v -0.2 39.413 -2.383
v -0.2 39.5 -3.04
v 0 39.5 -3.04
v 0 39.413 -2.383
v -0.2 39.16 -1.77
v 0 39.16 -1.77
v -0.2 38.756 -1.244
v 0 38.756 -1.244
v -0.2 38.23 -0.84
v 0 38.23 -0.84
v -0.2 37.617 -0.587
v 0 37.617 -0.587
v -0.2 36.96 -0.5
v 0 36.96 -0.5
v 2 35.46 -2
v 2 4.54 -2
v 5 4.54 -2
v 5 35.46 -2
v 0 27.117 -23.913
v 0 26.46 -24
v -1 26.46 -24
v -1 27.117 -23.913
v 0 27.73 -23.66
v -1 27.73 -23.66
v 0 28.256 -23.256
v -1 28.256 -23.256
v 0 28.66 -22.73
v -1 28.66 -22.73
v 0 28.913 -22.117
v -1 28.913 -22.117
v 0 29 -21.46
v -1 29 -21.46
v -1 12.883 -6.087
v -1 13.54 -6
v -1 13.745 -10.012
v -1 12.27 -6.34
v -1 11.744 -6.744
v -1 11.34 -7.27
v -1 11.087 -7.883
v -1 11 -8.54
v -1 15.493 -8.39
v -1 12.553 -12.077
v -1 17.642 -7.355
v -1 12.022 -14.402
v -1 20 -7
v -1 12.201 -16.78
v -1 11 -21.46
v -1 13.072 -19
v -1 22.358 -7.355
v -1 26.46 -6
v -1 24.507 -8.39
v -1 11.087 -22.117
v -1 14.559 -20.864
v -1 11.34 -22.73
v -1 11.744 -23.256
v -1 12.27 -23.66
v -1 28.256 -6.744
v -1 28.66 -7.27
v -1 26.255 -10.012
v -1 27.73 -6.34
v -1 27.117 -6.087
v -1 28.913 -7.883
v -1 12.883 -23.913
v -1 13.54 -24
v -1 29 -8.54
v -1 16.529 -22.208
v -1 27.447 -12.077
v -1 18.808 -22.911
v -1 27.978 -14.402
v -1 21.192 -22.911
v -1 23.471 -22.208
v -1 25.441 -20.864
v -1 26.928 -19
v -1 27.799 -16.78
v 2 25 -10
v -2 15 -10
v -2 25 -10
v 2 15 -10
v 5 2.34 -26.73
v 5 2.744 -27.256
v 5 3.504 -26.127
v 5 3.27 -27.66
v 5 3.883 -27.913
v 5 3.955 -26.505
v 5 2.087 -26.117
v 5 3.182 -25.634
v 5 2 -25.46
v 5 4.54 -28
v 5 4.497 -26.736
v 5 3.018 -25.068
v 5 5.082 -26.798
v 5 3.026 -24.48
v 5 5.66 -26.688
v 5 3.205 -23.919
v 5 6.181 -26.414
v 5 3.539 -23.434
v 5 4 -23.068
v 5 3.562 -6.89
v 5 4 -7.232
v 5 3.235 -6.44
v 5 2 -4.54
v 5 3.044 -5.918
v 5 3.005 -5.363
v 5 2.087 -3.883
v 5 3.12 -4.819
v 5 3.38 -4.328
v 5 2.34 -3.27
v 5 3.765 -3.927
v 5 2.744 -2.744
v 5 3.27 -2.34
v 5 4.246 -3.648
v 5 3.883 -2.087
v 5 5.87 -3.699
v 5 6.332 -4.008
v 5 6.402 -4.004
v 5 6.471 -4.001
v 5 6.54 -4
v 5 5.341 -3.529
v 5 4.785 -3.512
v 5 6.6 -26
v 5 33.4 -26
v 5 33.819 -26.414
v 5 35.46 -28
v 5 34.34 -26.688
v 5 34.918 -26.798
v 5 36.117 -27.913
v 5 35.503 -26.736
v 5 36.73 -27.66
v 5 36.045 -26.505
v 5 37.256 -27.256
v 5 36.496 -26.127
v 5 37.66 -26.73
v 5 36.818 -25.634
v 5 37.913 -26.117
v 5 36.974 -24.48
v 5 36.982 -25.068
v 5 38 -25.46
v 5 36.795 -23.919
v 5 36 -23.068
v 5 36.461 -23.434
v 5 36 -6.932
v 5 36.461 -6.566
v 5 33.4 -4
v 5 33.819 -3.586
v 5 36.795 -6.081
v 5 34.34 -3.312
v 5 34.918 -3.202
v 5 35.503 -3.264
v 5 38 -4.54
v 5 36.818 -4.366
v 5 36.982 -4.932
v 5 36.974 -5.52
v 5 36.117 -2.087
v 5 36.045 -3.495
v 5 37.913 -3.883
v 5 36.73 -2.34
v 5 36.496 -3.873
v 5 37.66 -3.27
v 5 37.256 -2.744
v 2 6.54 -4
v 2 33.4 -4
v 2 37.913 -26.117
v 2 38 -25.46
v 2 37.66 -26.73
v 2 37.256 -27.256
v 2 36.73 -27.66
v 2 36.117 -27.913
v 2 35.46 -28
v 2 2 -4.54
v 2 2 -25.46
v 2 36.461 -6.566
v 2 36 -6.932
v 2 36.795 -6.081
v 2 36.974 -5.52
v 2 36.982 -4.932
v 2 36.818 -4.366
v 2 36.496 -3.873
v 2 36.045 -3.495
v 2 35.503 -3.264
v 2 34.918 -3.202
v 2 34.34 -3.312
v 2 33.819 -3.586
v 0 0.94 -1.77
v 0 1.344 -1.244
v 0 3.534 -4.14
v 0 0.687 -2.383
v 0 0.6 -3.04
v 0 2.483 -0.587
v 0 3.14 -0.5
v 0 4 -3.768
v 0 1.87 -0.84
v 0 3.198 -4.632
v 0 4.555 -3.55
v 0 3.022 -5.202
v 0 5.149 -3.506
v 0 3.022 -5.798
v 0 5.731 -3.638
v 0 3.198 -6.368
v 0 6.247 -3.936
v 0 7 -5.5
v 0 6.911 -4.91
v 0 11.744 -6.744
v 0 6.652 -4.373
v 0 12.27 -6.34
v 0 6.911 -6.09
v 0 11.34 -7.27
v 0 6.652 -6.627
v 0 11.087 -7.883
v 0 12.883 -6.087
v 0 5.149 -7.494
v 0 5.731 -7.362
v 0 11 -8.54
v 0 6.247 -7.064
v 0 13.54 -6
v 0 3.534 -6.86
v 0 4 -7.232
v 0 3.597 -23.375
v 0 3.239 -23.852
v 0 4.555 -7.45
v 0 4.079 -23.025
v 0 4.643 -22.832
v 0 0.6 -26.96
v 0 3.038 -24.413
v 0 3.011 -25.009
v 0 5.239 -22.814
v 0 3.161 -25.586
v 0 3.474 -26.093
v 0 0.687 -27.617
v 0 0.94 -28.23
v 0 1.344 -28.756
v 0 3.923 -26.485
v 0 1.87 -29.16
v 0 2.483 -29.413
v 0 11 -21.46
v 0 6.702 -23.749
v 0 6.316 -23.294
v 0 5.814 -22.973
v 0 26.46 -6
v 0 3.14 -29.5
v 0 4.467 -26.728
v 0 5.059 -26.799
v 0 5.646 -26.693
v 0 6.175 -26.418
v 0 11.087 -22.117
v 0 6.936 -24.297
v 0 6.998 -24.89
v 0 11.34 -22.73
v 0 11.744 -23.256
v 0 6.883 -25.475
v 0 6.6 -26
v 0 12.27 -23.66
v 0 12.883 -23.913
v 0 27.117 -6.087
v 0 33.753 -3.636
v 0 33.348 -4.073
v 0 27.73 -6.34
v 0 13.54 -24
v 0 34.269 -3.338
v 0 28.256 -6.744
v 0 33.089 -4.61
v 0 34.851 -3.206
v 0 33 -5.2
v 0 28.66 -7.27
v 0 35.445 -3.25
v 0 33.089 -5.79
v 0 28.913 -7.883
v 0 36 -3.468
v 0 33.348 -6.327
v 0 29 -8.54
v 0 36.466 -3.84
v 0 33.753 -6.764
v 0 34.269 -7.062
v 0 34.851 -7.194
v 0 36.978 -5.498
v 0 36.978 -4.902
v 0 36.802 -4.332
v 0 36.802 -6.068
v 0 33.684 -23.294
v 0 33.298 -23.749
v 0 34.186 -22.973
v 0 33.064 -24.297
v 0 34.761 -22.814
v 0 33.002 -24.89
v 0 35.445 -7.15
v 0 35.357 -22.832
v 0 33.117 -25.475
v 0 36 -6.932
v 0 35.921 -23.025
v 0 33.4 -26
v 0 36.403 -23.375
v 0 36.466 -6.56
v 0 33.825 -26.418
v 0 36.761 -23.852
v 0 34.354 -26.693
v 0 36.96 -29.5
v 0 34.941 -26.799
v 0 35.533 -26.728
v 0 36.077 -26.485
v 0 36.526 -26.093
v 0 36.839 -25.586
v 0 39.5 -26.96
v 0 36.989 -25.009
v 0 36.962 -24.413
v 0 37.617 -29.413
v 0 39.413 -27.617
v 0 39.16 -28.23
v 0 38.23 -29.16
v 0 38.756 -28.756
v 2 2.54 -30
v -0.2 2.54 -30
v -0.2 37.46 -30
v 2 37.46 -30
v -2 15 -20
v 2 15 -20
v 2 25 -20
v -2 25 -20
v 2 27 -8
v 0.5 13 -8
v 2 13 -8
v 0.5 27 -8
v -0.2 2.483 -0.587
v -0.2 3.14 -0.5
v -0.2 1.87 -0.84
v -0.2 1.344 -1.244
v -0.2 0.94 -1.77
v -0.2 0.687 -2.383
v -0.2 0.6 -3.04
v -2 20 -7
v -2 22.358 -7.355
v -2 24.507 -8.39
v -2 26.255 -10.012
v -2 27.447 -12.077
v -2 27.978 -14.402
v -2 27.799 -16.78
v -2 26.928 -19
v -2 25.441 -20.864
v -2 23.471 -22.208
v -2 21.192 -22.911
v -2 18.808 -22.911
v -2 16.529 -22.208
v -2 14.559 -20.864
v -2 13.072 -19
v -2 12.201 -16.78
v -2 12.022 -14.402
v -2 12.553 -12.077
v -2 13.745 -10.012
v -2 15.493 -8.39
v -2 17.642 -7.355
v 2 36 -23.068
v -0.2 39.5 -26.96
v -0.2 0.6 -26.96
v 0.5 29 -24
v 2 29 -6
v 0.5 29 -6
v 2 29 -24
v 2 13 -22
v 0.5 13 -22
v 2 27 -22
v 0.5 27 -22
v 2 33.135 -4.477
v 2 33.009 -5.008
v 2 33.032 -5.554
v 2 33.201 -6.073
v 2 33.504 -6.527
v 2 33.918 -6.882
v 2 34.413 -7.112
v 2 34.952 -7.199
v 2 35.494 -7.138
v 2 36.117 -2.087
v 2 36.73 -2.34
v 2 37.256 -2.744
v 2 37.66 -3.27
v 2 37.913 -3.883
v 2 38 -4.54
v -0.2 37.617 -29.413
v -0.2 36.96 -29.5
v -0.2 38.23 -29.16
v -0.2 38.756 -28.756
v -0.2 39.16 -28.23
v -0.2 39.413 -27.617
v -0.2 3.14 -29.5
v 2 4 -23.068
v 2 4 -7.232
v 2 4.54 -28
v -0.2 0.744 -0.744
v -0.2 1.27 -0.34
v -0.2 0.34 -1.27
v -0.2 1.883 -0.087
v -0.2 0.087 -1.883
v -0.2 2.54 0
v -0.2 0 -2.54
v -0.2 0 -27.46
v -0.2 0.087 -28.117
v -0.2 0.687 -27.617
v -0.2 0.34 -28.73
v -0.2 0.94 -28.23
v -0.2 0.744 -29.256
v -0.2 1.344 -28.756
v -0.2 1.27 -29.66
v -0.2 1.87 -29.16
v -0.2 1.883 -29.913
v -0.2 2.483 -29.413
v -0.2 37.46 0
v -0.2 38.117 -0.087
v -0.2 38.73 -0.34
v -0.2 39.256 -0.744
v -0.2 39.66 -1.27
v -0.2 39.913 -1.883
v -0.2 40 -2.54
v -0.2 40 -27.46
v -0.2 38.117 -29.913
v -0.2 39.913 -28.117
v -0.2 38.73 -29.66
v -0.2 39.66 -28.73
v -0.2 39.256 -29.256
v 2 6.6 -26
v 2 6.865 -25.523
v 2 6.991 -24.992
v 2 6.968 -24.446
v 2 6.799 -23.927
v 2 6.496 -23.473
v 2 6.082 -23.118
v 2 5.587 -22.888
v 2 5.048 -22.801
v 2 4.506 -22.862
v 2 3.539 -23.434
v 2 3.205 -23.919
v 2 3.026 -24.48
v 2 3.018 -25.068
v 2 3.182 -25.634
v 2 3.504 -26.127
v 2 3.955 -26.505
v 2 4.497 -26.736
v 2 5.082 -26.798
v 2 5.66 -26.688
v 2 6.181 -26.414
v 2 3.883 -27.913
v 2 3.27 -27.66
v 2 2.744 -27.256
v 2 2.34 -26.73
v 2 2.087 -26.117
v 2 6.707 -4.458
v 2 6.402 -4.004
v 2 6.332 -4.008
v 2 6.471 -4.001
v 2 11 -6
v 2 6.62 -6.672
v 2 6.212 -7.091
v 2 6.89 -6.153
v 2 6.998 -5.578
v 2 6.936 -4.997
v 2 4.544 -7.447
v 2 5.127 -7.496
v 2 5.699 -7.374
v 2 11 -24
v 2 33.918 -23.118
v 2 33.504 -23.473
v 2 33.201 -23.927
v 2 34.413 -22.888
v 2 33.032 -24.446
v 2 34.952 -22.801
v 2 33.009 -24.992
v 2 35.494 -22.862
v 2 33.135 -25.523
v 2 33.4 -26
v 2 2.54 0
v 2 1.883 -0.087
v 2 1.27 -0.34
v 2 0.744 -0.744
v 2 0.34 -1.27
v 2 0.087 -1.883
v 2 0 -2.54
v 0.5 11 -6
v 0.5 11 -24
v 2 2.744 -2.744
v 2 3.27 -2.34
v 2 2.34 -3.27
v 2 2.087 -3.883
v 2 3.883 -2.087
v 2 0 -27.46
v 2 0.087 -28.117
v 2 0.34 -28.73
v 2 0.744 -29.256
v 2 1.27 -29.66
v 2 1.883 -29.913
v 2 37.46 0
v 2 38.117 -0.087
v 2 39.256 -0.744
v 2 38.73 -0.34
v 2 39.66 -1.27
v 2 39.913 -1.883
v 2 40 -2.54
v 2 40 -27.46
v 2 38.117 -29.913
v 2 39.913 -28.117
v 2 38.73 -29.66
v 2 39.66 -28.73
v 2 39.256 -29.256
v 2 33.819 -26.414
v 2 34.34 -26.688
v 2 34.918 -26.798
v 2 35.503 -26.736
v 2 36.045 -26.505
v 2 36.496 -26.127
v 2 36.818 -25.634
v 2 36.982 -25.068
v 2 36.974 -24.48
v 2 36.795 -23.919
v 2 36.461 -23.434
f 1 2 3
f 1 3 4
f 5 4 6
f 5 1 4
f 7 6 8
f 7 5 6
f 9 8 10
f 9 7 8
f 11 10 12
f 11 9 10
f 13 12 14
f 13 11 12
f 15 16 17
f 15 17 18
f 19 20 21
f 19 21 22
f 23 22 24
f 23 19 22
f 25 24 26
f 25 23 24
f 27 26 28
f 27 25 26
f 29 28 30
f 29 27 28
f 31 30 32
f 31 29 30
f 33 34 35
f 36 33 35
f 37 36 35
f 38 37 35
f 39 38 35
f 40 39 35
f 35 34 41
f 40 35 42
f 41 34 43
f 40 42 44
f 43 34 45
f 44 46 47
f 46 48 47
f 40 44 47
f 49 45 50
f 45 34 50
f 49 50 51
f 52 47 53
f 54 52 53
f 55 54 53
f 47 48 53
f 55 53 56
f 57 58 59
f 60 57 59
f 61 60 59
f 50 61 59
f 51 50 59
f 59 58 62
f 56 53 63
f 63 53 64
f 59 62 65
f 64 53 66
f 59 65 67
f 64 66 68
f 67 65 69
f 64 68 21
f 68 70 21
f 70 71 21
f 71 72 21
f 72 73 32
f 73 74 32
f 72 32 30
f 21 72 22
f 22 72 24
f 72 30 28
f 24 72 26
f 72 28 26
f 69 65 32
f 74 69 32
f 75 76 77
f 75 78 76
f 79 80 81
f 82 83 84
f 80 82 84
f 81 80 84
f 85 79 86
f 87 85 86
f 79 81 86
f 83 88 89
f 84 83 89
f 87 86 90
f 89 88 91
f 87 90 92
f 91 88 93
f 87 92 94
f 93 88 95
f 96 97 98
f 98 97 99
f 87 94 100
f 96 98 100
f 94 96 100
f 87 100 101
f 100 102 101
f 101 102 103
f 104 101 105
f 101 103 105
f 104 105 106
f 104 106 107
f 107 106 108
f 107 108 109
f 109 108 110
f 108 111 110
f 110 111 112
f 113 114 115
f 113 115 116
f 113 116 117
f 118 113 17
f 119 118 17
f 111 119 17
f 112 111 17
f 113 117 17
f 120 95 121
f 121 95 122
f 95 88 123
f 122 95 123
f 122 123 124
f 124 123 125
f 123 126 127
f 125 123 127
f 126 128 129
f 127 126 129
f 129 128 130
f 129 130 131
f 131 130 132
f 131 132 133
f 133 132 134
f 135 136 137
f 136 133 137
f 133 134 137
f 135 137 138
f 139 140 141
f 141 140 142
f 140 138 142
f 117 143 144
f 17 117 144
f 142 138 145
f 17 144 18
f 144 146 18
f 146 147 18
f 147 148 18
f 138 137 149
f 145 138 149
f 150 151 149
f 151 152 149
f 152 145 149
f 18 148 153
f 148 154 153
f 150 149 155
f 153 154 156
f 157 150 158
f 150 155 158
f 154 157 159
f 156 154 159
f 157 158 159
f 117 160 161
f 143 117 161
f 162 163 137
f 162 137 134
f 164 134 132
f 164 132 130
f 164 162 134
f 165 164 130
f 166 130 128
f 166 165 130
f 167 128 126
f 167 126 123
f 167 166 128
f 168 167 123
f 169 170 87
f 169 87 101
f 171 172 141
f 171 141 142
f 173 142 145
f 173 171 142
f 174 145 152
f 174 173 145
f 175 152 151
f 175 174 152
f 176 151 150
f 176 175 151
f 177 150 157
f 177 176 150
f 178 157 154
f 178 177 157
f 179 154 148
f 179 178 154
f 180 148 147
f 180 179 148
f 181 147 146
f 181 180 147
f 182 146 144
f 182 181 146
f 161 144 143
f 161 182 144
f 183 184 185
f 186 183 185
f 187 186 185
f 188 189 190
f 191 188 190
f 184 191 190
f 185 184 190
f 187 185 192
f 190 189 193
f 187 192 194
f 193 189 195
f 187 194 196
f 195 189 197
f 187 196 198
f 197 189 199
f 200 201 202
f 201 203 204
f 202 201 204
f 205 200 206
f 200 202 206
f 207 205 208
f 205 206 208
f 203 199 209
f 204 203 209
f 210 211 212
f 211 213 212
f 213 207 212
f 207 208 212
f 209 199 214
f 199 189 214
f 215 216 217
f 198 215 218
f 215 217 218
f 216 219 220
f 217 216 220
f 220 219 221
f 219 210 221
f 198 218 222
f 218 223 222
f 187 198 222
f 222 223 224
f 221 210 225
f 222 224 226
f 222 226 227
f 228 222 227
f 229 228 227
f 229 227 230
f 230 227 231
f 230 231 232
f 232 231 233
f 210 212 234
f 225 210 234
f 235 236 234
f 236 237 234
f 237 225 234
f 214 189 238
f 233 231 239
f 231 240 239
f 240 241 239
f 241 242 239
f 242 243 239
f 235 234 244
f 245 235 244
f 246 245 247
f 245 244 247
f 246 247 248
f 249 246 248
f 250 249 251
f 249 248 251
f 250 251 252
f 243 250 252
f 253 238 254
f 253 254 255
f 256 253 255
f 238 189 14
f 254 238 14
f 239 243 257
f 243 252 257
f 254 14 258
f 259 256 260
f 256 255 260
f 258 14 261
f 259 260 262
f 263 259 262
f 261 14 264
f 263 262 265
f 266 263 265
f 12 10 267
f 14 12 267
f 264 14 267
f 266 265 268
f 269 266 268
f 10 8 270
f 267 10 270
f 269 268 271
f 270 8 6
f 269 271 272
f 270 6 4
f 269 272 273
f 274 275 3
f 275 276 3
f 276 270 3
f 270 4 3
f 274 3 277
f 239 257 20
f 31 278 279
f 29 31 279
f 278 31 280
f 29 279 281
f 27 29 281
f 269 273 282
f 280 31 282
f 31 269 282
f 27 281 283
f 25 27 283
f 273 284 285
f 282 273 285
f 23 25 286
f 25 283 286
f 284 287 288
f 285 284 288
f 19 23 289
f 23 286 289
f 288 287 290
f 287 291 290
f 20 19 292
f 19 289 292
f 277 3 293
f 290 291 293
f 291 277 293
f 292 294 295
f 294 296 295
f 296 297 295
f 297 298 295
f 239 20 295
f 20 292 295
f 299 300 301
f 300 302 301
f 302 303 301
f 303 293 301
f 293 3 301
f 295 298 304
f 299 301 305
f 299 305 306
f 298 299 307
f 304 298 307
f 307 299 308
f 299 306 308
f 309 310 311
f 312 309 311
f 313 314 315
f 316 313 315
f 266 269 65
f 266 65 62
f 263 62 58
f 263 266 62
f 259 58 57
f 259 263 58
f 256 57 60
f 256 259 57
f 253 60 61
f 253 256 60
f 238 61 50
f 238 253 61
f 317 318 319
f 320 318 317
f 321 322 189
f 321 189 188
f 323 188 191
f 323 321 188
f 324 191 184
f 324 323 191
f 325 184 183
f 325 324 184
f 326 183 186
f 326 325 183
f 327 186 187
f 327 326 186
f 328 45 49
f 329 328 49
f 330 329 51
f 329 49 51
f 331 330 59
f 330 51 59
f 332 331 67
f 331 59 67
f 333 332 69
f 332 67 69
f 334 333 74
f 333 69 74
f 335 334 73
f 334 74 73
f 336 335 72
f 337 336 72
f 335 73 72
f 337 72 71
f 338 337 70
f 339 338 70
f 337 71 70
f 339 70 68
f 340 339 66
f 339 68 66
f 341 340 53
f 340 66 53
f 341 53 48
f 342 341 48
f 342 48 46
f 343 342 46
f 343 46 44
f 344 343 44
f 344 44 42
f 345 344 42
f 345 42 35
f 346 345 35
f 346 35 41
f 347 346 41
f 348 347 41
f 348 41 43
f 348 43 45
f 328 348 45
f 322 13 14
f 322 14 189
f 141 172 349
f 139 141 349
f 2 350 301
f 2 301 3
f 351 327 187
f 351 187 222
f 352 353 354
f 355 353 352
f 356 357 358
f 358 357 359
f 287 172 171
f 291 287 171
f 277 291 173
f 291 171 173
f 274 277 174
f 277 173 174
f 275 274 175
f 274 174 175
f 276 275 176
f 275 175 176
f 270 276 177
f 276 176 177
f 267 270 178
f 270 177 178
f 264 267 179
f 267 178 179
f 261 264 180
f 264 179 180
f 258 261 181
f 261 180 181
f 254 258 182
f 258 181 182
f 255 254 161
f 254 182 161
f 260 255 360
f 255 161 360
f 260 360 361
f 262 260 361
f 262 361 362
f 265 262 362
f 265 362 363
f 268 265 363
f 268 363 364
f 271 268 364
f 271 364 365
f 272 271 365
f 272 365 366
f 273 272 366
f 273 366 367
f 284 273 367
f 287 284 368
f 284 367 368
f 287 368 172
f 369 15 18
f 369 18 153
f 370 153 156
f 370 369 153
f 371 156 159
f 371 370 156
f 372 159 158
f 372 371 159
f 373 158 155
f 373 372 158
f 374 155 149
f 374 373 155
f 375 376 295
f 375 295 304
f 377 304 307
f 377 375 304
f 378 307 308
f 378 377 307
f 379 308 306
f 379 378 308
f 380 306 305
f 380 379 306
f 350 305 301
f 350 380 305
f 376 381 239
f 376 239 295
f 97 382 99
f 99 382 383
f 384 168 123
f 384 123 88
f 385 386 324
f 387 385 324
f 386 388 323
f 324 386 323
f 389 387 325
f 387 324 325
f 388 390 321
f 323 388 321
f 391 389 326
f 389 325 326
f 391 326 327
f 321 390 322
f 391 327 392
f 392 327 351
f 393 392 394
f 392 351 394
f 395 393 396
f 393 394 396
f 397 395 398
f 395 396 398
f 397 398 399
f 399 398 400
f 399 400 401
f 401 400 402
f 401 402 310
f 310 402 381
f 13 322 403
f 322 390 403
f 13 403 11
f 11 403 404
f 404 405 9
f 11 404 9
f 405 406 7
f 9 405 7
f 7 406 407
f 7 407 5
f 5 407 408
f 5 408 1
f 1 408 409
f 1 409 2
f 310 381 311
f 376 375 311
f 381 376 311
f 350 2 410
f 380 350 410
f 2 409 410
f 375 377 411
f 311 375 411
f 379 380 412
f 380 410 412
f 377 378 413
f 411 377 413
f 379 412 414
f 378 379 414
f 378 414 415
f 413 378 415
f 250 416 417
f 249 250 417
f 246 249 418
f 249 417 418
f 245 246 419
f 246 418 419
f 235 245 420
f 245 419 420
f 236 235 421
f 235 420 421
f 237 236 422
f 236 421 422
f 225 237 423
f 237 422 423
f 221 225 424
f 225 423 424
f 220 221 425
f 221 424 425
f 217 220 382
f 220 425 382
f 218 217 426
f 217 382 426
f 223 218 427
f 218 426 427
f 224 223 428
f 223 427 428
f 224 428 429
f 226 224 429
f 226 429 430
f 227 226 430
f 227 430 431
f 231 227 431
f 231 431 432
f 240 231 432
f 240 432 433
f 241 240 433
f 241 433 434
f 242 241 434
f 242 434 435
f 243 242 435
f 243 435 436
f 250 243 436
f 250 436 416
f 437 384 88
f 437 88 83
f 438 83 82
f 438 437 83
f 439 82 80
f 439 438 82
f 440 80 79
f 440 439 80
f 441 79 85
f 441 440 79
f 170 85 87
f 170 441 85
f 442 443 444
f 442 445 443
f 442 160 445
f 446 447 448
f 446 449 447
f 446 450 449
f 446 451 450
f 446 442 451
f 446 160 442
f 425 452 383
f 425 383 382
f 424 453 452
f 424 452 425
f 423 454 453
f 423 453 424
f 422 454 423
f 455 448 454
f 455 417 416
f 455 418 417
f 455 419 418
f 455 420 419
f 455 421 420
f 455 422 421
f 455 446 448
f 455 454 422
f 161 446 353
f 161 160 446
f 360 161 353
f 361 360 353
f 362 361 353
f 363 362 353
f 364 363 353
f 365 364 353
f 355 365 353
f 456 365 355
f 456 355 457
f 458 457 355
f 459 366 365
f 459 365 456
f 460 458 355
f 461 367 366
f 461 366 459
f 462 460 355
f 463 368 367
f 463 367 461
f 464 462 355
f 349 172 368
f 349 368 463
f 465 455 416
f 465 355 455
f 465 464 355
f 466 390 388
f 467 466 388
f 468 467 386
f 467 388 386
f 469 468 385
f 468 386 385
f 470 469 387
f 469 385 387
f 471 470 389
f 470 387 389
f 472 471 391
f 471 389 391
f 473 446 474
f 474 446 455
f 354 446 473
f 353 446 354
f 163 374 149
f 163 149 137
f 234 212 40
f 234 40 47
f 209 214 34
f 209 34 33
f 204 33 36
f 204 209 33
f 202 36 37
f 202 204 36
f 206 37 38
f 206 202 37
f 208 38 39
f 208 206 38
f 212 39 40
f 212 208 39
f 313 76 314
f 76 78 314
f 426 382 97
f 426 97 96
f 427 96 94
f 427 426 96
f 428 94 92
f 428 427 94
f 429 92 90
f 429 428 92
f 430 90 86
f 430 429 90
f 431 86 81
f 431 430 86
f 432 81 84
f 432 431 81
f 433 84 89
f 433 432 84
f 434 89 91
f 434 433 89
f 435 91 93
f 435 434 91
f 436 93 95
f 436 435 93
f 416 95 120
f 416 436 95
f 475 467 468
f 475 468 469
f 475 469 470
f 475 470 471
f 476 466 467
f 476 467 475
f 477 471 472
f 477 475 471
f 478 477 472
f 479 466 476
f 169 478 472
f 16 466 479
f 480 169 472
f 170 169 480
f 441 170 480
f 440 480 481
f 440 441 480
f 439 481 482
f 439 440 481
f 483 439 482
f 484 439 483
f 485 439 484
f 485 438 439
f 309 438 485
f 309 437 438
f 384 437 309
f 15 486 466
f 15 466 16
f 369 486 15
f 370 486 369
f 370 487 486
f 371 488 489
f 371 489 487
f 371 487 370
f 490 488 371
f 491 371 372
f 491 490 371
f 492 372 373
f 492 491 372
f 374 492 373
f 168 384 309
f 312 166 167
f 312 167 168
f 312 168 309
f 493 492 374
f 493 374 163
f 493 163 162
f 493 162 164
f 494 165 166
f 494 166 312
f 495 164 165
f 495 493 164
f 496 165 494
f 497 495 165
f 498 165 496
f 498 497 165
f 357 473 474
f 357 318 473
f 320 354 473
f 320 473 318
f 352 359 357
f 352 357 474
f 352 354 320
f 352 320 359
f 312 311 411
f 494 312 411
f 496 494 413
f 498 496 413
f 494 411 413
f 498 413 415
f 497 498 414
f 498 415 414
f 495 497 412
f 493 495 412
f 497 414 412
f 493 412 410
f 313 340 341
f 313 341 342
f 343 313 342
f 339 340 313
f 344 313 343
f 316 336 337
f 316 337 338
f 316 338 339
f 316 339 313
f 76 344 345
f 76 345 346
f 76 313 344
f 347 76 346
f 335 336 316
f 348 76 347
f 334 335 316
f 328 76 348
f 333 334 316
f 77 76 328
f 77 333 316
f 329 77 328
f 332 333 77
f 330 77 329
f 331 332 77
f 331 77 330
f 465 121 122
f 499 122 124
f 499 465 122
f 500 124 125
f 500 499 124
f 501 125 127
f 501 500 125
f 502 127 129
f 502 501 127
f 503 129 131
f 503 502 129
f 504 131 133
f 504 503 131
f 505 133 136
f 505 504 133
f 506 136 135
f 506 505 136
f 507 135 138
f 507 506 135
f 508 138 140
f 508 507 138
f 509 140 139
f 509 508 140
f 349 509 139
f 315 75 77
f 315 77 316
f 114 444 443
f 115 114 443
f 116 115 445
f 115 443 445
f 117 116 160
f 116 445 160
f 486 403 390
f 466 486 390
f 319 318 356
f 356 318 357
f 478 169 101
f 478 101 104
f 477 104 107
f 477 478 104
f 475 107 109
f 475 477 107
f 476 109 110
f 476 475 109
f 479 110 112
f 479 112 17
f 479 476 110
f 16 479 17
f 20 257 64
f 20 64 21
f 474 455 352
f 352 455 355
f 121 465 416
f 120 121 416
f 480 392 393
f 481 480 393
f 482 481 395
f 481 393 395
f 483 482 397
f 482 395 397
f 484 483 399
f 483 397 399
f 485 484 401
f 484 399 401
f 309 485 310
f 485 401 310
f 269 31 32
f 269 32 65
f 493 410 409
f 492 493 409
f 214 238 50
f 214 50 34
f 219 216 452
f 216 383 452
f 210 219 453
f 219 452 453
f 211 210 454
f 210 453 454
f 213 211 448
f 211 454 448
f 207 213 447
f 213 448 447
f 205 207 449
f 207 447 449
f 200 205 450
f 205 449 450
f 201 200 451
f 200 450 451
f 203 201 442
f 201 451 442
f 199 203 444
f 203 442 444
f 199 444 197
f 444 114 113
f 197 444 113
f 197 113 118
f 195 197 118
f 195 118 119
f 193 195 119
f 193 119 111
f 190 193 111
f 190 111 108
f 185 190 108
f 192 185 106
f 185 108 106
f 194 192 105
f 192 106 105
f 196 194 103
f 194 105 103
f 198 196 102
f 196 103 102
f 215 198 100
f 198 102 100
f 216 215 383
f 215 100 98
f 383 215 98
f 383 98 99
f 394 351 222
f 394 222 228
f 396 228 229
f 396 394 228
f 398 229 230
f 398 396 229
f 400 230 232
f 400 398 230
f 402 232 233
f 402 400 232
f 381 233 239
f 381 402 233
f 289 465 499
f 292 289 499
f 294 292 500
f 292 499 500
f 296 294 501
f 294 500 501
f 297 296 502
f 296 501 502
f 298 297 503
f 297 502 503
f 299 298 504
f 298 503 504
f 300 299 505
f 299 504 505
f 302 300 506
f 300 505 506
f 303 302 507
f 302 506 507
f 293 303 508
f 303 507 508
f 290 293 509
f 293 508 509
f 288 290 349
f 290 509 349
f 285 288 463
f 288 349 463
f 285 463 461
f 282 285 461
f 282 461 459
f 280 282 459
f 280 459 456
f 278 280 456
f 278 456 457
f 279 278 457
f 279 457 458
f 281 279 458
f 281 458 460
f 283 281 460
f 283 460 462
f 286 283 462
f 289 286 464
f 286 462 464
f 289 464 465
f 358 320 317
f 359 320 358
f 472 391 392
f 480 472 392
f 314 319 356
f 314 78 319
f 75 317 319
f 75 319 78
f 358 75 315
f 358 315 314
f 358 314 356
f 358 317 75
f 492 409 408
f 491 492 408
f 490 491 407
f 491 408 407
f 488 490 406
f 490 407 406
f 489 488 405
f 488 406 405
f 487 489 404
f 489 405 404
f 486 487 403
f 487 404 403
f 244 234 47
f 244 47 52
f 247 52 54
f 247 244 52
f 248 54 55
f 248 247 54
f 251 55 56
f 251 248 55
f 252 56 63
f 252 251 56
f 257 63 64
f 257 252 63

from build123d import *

# Parameters (mm, degrees)
BOSS_EXTRUDE2_DEPTH  = 2
SKETCH3_W            = 6
SKETCH3_H            = 6
CUT_EXTRUDE1_DEPTH   = 2
SKETCH4_R            = 5
BOSS_EXTRUDE3_DEPTH  = 1.5
SKETCH5_W            = 12
SKETCH5_H            = 12
BOSS_EXTRUDE4_DEPTH  = 1
SKETCH6_W            = 6
SKETCH6_H            = 6
CUT_EXTRUDE2_DEPTH   = 10
SKETCH7_W            = 16
SKETCH7_H            = 16
BOSS_EXTRUDE5_DEPTH  = 1
SKETCH9_R            = 6
BOSS_EXTRUDE6_DEPTH  = 1
SKETCH10_W           = 6
SKETCH10_H           = 6
CUT_EXTRUDE3_DEPTH   = 10
BOSS_EXTRUDE7_DEPTH  = 3
CUT_EXTRUDE4_DEPTH   = 1
SKETCH13_W           = 14
SKETCH13_H           = 14
SKETCH13_W_2         = 10
SKETCH13_H_2         = 10
CUT_EXTRUDE5_DEPTH   = 1.5
BOSS_EXTRUDE8_DEPTH  = 3
SKETCH16_R           = 7
BOSS_EXTRUDE9_DEPTH  = 1
SKETCH17_W           = 6
SKETCH17_H           = 6
CUT_EXTRUDE7_DEPTH   = 4
SKETCH18_W           = 8
SKETCH18_H           = 8
CUT_EXTRUDE8_DEPTH   = 10
SKETCH19_W           = 12
SKETCH19_H           = 12
SKETCH19_W_2         = 8
SKETCH19_H_2         = 8
BOSS_EXTRUDE10_DEPTH = 1.5
SKETCH20_W           = 16
SKETCH20_H           = 16
SKETCH20_W_2         = 12
SKETCH20_H_2         = 12
CUT_EXTRUDE9_DEPTH   = 1.5
SKETCH23_W           = 10
SKETCH23_H           = 10
SKETCH23_W_2         = 8
SKETCH23_H_2         = 8
CUT_EXTRUDE15_DEPTH  = 10
SKETCH24_R           = 8
BOSS_EXTRUDE11_DEPTH = 1
SKETCH25_W           = 10
SKETCH25_H           = 10
CUT_EXTRUDE16_DEPTH  = 1
BOSS_EXTRUDE12_DEPTH = 1
SKETCH27_W           = 10
SKETCH27_H           = 10
CUT_EXTRUDE17_DEPTH  = 1
SKETCH28_W           = 14
SKETCH28_H           = 14
SKETCH28_W_2         = 12
SKETCH28_H_2         = 12
BOSS_EXTRUDE13_DEPTH = 1.5
SKETCH29_W           = 18
SKETCH29_H           = 18
SKETCH29_W_2         = 16
SKETCH29_H_2         = 16
CUT_EXTRUDE18_DEPTH  = 1.5
BOSS_EXTRUDE14_START = 0.2
BOSS_EXTRUDE14_DEPTH = 0.2
SKETCH31_R           = 2
CUT_EXTRUDE19_DEPTH  = 7.826


with BuildPart() as part:
    # Sketch2 → Boss-Extrude2 (new body)
    with BuildSketch(Plane(origin=(0, 0, 0), x_dir=(0, 0, -1), z_dir=(1, 0, 0))):
        with BuildLine():
            Line((2.54, 0), (27.46, 0))
            ThreePointArc((27.46, 0), (29.256051224, 0.743948776), (30, 2.54))
            Line((30, 2.54), (30, 37.46))
            ThreePointArc((30, 37.46), (29.256051224, 39.256051224), (27.46, 40))
            Line((27.46, 40), (2.54, 40))
            ThreePointArc((2.54, 40), (0.743948776, 39.256051224), (0, 37.46))
            Line((0, 37.46), (0, 2.54))
            ThreePointArc((0, 2.54), (0.743948776, 0.743948776), (2.54, 0))
        make_face()
    extrude(amount=BOSS_EXTRUDE2_DEPTH)

    # Sketch3 → Cut-Extrude1 (cut)
    with BuildSketch(Plane.ZY):
        with Locations((-15, 20)):
            Rectangle(SKETCH3_W, SKETCH3_H)
    extrude(amount=-CUT_EXTRUDE1_DEPTH, mode=Mode.SUBTRACT)

    # Sketch4 → Boss-Extrude3 (add)
    with BuildSketch(Plane.ZY):
        with Locations((-15, 20)):
            Circle(SKETCH4_R)
    extrude(amount=BOSS_EXTRUDE3_DEPTH)

    # Sketch5 → Boss-Extrude4 (add)
    with BuildSketch(Plane.ZY):
        with Locations((-15, 20)):
            Rectangle(SKETCH5_W, SKETCH5_H)
    extrude(amount=BOSS_EXTRUDE4_DEPTH)

    # Sketch6 → Cut-Extrude2 (cut)
    with BuildSketch(Plane(origin=(2, 0, 0), x_dir=(0, 0, -1), z_dir=(1, 0, 0))):
        with Locations((15, 20)):
            Rectangle(SKETCH6_W, SKETCH6_H)
    extrude(amount=-CUT_EXTRUDE2_DEPTH, mode=Mode.SUBTRACT)

    # Sketch7 → Boss-Extrude5 (add)
    with BuildSketch(Plane.ZY):
        with Locations((-15, 20)):
            Rectangle(SKETCH7_W, SKETCH7_H)
    extrude(amount=BOSS_EXTRUDE5_DEPTH)

    # Sketch9 → Boss-Extrude6 (add)
    with BuildSketch(Plane.ZY.offset(1)):
        with Locations(Location((-15, 20, 0), (0, 0, 180))):
            Circle(SKETCH9_R)
    extrude(amount=BOSS_EXTRUDE6_DEPTH)

    # Sketch10 → Cut-Extrude3 (cut)
    with BuildSketch(Plane(origin=(0, 0, 0), x_dir=(0, 0, -1), z_dir=(1, 0, 0))):
        with Locations((15, 20)):
            Rectangle(SKETCH10_W, SKETCH10_H)
    extrude(amount=-CUT_EXTRUDE3_DEPTH, mode=Mode.SUBTRACT)

    # Sketch11 → Boss-Extrude7 (add)
    with BuildSketch(Plane(origin=(2, 0, 0), x_dir=(0, 0, -1), z_dir=(1, 0, 0))):
        with BuildLine():
            Line((4.54, 38), (25.46, 38))
            ThreePointArc((25.46, 38), (27.256051224, 37.256051224), (28, 35.46))
            Line((28, 35.46), (28, 4.54))
            ThreePointArc((28, 4.54), (27.256051224, 2.743948776), (25.46, 2))
            Line((25.46, 2), (4.54, 2))
            ThreePointArc((4.54, 2), (2.743948776, 2.743948776), (2, 4.54))
            Line((2, 4.54), (2, 35.46))
            ThreePointArc((2, 35.46), (2.743948776, 37.256051224), (4.54, 38))
        make_face()
        with BuildLine():
            Line((6.54, 36), (23.46, 36))
            ThreePointArc((23.46, 36), (25.256051224, 35.256051224), (26, 33.46))
            Line((26, 33.46), (26, 6.54))
            ThreePointArc((26, 6.54), (25.256051224, 4.743948776), (23.46, 4))
            Line((23.46, 4), (6.54, 4))
            ThreePointArc((6.54, 4), (4.743948776, 4.743948776), (4, 6.54))
            Line((4, 6.54), (4, 33.46))
            ThreePointArc((4, 33.46), (4.743948776, 35.256051224), (6.54, 36))
        make_face(mode=Mode.SUBTRACT)
    extrude(amount=BOSS_EXTRUDE7_DEPTH)

    # Sketch12 → Cut-Extrude4 (cut)
    with BuildSketch(Plane.ZY.offset(1)):
        with BuildLine():
            Line((-23, 28), (-20.46, 28))
            ThreePointArc((-20.46, 28), (-22.256051224, 27.256051224), (-23, 25.46))
            Line((-23, 25.46), (-23, 28))
        make_face()
        with BuildLine():
            Line((-7, 28), (-7, 25.46))
            ThreePointArc((-7, 25.46), (-7.743948776, 27.256051224), (-9.54, 28))
            Line((-9.54, 28), (-7, 28))
        make_face()
        with BuildLine():
            Line((-7, 12), (-9.54, 12))
            ThreePointArc((-9.54, 12), (-7.743948776, 12.743948776), (-7, 14.54))
            Line((-7, 14.54), (-7, 12))
        make_face()
        with BuildLine():
            Line((-23, 12), (-23, 14.54))
            ThreePointArc((-23, 14.54), (-22.256051224, 12.743948776), (-20.46, 12))
            Line((-20.46, 12), (-23, 12))
        make_face()
    extrude(amount=-CUT_EXTRUDE4_DEPTH, mode=Mode.SUBTRACT)

    # Sketch13 → Cut-Extrude5 (cut)
    with BuildSketch(Plane(origin=(2, 0, 0), x_dir=(0, 0, -1), z_dir=(1, 0, 0))):
        with Locations((15, 20)):
            Rectangle(SKETCH13_W, SKETCH13_H)
        with Locations((15, 20)):
            Rectangle(SKETCH13_W_2, SKETCH13_H_2, mode=Mode.SUBTRACT)
    extrude(amount=-CUT_EXTRUDE5_DEPTH, mode=Mode.SUBTRACT)

    # Sketch14 → Boss-Extrude8 (add)
    with BuildSketch(Plane.ZY.offset(2)):
        with BuildLine():
            Line((-17.46, 25), (-12.54, 25))
            ThreePointArc((-12.54, 25), (-10.743948776, 24.256051224), (-10, 22.46))
            Line((-10, 22.46), (-10, 17.54))
            ThreePointArc((-10, 17.54), (-10.743948776, 15.743948776), (-12.54, 15))
            Line((-12.54, 15), (-17.46, 15))
            ThreePointArc((-17.46, 15), (-19.256051224, 15.743948776), (-20, 17.54))
            Line((-20, 17.54), (-20, 22.46))
            ThreePointArc((-20, 22.46), (-19.256051224, 24.256051224), (-17.46, 25))
        make_face()
    extrude(amount=-BOSS_EXTRUDE8_DEPTH)

    # Sketch16 → Boss-Extrude9 (add)
    with BuildSketch(Plane.ZY.offset(2)):
        with Locations((-15, 20)):
            Circle(SKETCH16_R)
    extrude(amount=-BOSS_EXTRUDE9_DEPTH)

    # Sketch17 → Cut-Extrude7 (cut)
    with BuildSketch(Plane(origin=(1, 0, 0), x_dir=(0, 0, -1), z_dir=(1, 0, 0))):
        with Locations((15, 20)):
            Rectangle(SKETCH17_W, SKETCH17_H)
    extrude(amount=-CUT_EXTRUDE7_DEPTH, mode=Mode.SUBTRACT)

    # Sketch18 → Cut-Extrude8 (cut)
    with BuildSketch(Plane.ZY.offset(2)):
        with Locations((-15, 20)):
            Rectangle(SKETCH18_W, SKETCH18_H)
    extrude(amount=-CUT_EXTRUDE8_DEPTH, mode=Mode.SUBTRACT)

    # Sketch19 → Boss-Extrude10 (add)
    with BuildSketch(Plane(origin=(0.5, 0, 0), x_dir=(0, 0, -1), z_dir=(1, 0, 0))):
        with Locations((15, 20)):
            Rectangle(SKETCH19_W, SKETCH19_H)
        with Locations((15, 20)):
            Rectangle(SKETCH19_W_2, SKETCH19_H_2, mode=Mode.SUBTRACT)
    extrude(amount=BOSS_EXTRUDE10_DEPTH)

    # Sketch20 → Cut-Extrude9 (cut)
    with BuildSketch(Plane(origin=(2, 0, 0), x_dir=(0, 0, -1), z_dir=(1, 0, 0))):
        with Locations((15, 20)):
            Rectangle(SKETCH20_W, SKETCH20_H)
        with Locations((15, 20)):
            Rectangle(SKETCH20_W_2, SKETCH20_H_2, mode=Mode.SUBTRACT)
    extrude(amount=-CUT_EXTRUDE9_DEPTH, mode=Mode.SUBTRACT)

    # Sketch23 → Cut-Extrude15 (cut)
    with BuildSketch(Plane(origin=(2, 0, 0), x_dir=(0, 0, -1), z_dir=(1, 0, 0))):
        with Locations((15, 20)):
            Rectangle(SKETCH23_W, SKETCH23_H)
        with Locations((15, 20)):
            Rectangle(SKETCH23_W_2, SKETCH23_H_2, mode=Mode.SUBTRACT)
    extrude(amount=-CUT_EXTRUDE15_DEPTH, mode=Mode.SUBTRACT)

    # Sketch24 → Boss-Extrude11 (add)
    with BuildSketch(Plane.ZY.offset(1)):
        with Locations((-15, 20)):
            Circle(SKETCH24_R)
    extrude(amount=BOSS_EXTRUDE11_DEPTH)

    # Sketch25 → Cut-Extrude16 (cut)
    with BuildSketch(Plane(origin=(-1, 0, 0), x_dir=(0, 0, -1), z_dir=(1, 0, 0))):
        with Locations((15, 20)):
            Rectangle(SKETCH25_W, SKETCH25_H)
    extrude(amount=-CUT_EXTRUDE16_DEPTH, mode=Mode.SUBTRACT)

    # Sketch26 → Boss-Extrude12 (add)
    with BuildSketch(Plane.ZY):
        with BuildLine():
            Line((-21.46, 29), (-8.54, 29))
            ThreePointArc((-8.54, 29), (-6.743948776, 28.256051224), (-6, 26.46))
            Line((-6, 26.46), (-6, 13.54))
            ThreePointArc((-6, 13.54), (-6.743948776, 11.743948776), (-8.54, 11))
            Line((-8.54, 11), (-21.46, 11))
            ThreePointArc((-21.46, 11), (-23.256051224, 11.743948776), (-24, 13.54))
            Line((-24, 13.54), (-24, 26.46))
            ThreePointArc((-24, 26.46), (-23.256051224, 28.256051224), (-21.46, 29))
        make_face()
    extrude(amount=BOSS_EXTRUDE12_DEPTH)

    # Sketch27 → Cut-Extrude17 (cut)
    with BuildSketch(Plane(origin=(0, 0, 0), x_dir=(0, 0, -1), z_dir=(1, 0, 0))):
        with Locations((15, 20)):
            Rectangle(SKETCH27_W, SKETCH27_H)
    extrude(amount=-CUT_EXTRUDE17_DEPTH, mode=Mode.SUBTRACT)

    # Sketch28 → Boss-Extrude13 (add)
    with BuildSketch(Plane(origin=(0.5, 0, 0), x_dir=(0, 0, -1), z_dir=(1, 0, 0))):
        with Locations((15, 20)):
            Rectangle(SKETCH28_W, SKETCH28_H)
        with Locations((15, 20)):
            Rectangle(SKETCH28_W_2, SKETCH28_H_2, mode=Mode.SUBTRACT)
    extrude(amount=BOSS_EXTRUDE13_DEPTH)

    # Sketch29 → Cut-Extrude18 (cut)
    with BuildSketch(Plane(origin=(2, 0, 0), x_dir=(0, 0, -1), z_dir=(1, 0, 0))):
        with Locations((15, 20)):
            Rectangle(SKETCH29_W, SKETCH29_H)
        with Locations((15, 20)):
            Rectangle(SKETCH29_W_2, SKETCH29_H_2, mode=Mode.SUBTRACT)
    extrude(amount=-CUT_EXTRUDE18_DEPTH, mode=Mode.SUBTRACT)

    # Sketch30 → Boss-Extrude14 (add)
    with BuildSketch(Plane.ZY.offset(BOSS_EXTRUDE14_START)):
        with BuildLine():
            Line((-27.46, 40), (-2.54, 40))
            ThreePointArc((-2.54, 40), (-0.743948776, 39.256051224), (0, 37.46))
            Line((0, 37.46), (0, 2.54))
            ThreePointArc((0, 2.54), (-0.743948776, 0.743948776), (-2.54, 0))
            Line((-2.54, 0), (-27.46, 0))
            ThreePointArc((-27.46, 0), (-29.256051224, 0.743948776), (-30, 2.54))
            Line((-30, 2.54), (-30, 37.46))
            ThreePointArc((-30, 37.46), (-29.256051224, 39.256051224), (-27.46, 40))
        make_face()
        with BuildLine():
            Line((-26.96, 39.5), (-3.04, 39.5))
            ThreePointArc((-3.04, 39.5), (-1.243948776, 38.756051224), (-0.5, 36.96))
            Line((-0.5, 36.96), (-0.5, 3.14))
            ThreePointArc((-0.5, 3.14), (-1.243948776, 1.343948776), (-3.04, 0.6))
            Line((-3.04, 0.6), (-26.96, 0.6))
            ThreePointArc((-26.96, 0.6), (-28.756051224, 1.343948776), (-29.5, 3.14))
            Line((-29.5, 3.14), (-29.5, 36.96))
            ThreePointArc((-29.5, 36.96), (-28.756051224, 38.756051224), (-26.96, 39.5))
        make_face(mode=Mode.SUBTRACT)
    extrude(amount=-BOSS_EXTRUDE14_DEPTH)

    # Sketch31 → Cut-Extrude19 (cut, symmetric)
    with BuildSketch(Plane(origin=(2, 0, 0), x_dir=(0, 0, -1), z_dir=(1, 0, 0))):
        with Locations(Location((5.2, 35, 0), (0, 0, 30))):
            Circle(SKETCH31_R)
        with Locations(Location((24.8, 35, 0), (0, 0, 306.869897646))):
            Circle(SKETCH31_R)
        with Locations(Location((24.8, 5, 0), (0, 0, 53.130102354))):
            Circle(SKETCH31_R)
        with Locations(Location((5.5, 5, 0), (0, 0, 330))):
            Circle(SKETCH31_R)
    extrude(amount=CUT_EXTRUDE19_DEPTH, both=True, mode=Mode.SUBTRACT)


solid = part.part
